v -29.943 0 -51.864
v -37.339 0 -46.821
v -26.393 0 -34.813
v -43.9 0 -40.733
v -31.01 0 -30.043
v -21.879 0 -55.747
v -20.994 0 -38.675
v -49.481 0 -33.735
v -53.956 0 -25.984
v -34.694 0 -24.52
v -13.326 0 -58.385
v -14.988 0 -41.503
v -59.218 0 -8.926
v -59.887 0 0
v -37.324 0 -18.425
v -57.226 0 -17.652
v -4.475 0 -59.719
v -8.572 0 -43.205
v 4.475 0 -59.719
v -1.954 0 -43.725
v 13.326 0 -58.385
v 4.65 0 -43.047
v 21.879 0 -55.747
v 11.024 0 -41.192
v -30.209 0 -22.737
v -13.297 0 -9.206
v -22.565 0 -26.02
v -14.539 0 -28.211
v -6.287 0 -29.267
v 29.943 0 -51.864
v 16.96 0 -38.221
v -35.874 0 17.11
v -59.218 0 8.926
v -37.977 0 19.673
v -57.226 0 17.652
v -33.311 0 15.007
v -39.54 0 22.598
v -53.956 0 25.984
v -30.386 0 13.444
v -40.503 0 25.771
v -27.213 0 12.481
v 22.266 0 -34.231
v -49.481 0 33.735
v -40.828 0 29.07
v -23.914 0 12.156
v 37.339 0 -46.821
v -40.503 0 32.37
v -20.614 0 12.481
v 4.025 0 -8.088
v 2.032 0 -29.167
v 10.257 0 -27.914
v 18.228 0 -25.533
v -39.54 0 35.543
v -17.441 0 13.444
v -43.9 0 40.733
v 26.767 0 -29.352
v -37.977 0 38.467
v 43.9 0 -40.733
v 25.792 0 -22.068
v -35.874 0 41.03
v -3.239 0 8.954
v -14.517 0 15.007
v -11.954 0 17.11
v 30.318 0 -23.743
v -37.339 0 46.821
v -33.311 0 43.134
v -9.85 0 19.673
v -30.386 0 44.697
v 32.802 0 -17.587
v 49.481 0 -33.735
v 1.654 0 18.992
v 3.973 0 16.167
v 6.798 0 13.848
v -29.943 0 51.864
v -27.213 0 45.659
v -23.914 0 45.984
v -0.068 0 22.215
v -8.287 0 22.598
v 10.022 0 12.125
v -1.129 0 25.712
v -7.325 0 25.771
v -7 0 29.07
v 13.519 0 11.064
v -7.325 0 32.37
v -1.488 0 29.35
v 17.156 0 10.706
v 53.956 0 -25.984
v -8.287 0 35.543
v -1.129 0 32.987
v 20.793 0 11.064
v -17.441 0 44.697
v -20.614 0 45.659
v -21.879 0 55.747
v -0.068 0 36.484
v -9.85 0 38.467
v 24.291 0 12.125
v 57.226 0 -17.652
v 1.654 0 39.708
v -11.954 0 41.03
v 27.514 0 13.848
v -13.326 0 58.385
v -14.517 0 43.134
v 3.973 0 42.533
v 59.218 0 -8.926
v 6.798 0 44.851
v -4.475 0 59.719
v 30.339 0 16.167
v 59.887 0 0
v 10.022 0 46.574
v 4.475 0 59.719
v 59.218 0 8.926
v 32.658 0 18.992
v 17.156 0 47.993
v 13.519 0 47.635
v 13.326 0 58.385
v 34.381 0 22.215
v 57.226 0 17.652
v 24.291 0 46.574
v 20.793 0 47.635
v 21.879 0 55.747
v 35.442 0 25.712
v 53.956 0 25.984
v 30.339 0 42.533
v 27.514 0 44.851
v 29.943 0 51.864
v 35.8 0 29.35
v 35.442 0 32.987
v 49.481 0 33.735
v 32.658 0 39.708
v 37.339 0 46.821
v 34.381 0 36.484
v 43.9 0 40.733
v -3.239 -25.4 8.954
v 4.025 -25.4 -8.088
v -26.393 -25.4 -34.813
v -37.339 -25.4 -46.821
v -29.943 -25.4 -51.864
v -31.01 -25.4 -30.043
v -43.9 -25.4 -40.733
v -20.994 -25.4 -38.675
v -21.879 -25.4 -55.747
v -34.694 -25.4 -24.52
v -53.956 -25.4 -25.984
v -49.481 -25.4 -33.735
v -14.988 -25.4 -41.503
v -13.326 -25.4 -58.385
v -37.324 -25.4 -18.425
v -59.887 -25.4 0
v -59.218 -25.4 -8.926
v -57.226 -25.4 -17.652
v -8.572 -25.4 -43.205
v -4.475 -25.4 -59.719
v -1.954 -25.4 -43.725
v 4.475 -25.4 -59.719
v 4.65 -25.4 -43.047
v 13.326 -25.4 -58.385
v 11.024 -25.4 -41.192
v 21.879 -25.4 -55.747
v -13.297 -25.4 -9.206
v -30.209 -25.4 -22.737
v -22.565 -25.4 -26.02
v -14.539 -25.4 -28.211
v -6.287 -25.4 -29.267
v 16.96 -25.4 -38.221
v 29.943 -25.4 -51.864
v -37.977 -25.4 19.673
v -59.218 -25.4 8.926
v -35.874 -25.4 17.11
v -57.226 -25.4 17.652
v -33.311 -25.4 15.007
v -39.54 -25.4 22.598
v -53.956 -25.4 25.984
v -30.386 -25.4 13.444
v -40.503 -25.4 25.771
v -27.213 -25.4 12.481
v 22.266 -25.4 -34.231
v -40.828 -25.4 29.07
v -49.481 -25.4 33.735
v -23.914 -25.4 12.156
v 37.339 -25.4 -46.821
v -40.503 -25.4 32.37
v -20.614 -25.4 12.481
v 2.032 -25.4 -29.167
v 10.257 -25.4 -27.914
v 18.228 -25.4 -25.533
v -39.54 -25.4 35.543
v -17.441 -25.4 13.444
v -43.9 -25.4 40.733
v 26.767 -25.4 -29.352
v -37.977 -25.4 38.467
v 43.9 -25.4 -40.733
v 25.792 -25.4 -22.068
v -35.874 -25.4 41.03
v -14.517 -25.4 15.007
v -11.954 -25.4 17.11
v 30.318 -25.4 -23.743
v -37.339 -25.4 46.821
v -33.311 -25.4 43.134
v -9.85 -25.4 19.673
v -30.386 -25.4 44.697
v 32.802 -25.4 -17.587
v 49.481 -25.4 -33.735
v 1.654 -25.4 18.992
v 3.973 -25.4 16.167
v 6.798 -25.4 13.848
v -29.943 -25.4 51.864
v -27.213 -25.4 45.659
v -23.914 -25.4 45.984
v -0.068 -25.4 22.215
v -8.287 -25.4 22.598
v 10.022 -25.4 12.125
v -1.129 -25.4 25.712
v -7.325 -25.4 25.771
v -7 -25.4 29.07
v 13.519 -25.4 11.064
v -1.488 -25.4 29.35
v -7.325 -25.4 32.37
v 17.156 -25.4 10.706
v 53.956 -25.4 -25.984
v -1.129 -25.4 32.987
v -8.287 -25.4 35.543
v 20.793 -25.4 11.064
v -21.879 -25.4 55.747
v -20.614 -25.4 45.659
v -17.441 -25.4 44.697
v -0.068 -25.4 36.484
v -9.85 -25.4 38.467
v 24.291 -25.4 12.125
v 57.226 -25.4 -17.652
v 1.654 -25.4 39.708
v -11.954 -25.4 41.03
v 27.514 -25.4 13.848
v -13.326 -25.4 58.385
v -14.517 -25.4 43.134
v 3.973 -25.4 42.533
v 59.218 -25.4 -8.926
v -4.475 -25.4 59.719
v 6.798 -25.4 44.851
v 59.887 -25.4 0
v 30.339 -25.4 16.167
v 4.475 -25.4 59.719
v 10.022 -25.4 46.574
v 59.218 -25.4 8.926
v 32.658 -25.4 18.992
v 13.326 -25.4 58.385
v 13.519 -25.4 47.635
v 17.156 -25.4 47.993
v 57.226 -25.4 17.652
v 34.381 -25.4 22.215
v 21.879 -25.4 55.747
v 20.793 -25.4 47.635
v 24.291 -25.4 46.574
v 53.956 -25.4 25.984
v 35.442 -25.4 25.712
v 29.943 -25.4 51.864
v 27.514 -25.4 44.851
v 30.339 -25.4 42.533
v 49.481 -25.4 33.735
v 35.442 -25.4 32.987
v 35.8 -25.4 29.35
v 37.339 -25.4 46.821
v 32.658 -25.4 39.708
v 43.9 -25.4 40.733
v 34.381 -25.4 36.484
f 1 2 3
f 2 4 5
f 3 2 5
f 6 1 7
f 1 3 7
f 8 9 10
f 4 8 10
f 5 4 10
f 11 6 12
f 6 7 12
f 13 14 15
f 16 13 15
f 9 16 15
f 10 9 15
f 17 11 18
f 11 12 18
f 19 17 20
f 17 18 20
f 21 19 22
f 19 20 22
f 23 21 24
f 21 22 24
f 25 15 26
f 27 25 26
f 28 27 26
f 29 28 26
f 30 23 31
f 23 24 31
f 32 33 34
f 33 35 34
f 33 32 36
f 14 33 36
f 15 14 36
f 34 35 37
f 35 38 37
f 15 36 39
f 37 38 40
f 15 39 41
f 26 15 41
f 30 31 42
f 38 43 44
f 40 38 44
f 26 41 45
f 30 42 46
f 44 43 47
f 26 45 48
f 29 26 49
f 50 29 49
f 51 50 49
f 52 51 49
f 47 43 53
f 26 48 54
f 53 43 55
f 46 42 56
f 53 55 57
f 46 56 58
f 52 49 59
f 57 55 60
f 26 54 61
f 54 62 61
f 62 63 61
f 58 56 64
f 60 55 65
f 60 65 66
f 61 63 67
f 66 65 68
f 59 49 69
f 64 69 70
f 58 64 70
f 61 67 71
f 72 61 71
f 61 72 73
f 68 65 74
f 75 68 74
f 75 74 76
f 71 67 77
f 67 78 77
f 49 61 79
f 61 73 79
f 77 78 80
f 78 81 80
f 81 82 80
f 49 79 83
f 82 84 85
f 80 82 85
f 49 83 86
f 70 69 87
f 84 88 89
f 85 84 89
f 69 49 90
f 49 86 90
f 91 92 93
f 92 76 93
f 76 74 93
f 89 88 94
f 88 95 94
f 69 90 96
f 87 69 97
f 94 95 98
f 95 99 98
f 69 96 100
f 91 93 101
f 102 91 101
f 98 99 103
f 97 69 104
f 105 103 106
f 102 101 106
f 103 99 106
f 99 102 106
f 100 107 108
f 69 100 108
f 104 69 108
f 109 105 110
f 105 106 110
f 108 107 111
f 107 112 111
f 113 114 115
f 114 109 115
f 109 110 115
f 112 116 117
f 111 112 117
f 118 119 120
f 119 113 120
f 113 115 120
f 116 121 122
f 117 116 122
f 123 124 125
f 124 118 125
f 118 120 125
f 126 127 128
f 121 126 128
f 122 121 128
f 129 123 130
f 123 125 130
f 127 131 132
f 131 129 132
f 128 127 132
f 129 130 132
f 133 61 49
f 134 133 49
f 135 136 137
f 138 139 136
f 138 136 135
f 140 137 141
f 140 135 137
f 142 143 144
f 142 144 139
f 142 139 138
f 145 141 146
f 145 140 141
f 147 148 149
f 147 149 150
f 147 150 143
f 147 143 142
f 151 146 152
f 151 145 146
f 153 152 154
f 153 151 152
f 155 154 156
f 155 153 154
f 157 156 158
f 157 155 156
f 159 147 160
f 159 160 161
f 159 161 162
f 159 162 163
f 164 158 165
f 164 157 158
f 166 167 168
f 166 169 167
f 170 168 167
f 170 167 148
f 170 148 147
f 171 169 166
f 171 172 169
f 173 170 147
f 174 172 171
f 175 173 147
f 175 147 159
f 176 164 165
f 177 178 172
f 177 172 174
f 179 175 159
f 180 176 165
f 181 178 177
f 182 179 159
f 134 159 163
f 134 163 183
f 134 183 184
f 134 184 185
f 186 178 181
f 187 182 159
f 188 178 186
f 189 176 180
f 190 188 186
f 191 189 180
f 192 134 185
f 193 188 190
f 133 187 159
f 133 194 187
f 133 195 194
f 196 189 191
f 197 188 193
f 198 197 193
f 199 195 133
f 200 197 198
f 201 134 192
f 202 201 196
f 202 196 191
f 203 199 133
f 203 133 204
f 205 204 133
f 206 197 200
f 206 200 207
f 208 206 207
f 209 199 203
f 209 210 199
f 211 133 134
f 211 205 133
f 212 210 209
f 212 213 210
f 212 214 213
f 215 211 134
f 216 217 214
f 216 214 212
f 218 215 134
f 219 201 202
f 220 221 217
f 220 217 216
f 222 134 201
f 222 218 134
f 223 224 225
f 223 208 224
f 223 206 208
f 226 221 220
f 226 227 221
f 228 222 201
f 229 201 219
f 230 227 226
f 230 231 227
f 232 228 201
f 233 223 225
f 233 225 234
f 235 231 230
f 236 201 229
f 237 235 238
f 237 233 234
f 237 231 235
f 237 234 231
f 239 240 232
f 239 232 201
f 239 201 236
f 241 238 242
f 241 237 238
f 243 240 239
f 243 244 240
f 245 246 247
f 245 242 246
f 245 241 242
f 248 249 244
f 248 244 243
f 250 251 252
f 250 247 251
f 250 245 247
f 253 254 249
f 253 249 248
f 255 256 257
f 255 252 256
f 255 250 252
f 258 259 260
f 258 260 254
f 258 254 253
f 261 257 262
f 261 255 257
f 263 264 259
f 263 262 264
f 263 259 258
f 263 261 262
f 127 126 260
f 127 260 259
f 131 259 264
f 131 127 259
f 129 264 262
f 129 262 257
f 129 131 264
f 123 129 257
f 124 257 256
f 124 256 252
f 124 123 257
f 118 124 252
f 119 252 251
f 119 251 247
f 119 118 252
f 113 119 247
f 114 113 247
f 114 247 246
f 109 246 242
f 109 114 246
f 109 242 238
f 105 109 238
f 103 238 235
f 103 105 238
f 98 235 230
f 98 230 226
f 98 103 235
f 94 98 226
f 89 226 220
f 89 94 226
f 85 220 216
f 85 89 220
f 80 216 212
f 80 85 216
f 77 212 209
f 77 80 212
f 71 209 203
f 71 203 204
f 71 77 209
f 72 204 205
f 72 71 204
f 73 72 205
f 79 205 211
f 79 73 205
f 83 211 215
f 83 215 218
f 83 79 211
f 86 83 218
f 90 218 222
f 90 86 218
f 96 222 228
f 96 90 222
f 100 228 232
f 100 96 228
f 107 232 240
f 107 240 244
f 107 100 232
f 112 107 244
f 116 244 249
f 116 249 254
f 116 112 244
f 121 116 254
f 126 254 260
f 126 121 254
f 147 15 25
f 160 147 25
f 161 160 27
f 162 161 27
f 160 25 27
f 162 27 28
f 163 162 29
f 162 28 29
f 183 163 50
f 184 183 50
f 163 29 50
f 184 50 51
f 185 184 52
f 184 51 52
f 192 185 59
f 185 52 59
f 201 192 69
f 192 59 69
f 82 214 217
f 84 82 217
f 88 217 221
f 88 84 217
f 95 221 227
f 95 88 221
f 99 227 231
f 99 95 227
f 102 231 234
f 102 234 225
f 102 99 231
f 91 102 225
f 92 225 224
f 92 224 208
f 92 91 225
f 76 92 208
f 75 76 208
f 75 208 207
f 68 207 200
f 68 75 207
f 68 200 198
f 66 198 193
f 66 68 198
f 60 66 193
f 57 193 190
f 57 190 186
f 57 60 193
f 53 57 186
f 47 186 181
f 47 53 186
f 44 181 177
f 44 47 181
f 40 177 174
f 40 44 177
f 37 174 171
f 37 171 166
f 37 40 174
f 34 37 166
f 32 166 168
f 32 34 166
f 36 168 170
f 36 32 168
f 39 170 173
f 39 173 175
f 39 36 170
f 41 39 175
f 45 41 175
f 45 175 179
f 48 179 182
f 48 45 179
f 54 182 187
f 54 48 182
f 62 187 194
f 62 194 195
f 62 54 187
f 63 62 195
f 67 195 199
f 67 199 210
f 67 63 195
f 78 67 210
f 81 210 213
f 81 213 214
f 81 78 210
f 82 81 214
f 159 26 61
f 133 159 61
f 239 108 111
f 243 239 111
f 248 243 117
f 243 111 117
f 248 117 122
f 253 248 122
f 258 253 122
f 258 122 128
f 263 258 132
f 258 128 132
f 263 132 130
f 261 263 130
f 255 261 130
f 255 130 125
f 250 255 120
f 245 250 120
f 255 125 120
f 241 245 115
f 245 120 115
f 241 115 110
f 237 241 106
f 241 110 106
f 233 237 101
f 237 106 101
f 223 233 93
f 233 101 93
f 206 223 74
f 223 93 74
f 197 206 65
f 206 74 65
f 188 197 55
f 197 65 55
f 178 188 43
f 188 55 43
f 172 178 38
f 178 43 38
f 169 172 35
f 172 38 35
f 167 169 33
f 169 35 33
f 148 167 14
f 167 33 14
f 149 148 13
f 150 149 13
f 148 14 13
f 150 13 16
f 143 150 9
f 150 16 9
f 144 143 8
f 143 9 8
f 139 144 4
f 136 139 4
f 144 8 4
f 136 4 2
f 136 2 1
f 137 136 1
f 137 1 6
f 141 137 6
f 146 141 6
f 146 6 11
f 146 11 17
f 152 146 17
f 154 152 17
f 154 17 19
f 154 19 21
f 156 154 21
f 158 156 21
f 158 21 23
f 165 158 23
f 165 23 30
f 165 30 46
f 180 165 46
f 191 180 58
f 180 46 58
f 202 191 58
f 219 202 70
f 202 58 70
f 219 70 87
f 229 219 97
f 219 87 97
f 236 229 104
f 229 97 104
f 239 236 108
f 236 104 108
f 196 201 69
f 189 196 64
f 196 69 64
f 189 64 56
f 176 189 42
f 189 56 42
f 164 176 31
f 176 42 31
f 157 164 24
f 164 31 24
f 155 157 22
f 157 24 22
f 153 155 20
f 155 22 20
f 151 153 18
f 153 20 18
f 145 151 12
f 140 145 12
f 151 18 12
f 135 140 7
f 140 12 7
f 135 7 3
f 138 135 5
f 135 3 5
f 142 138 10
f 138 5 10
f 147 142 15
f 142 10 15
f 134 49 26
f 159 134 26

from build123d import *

# Parameters (mm, degrees)
F0_R     = 59.886872
F0_R_2   = 16.913856
F0_R_3   = 18.643696
F1_DEPTH = 25.4


with BuildPart() as f1:
    # F0 (on Front) → F1 (new body)
    with BuildSketch(Plane.XZ):
        Circle(F0_R)
        with BuildLine():
            ThreePointArc((32.801818, -17.587269), (-1.953813, -43.724895), (-37.324231, -18.425429))
            ThreePointArc((-37.324231, -18.425429), (-2.125486, -29.361637), (32.801818, -17.587269))
        make_face(mode=Mode.SUBTRACT)
        Polygon((4.024993, -8.088123), (-13.296979, -9.20567), (-3.239061, 8.954463), align=None, mode=Mode.SUBTRACT)
        with Locations((-23.913672, 29.070303)):
            Circle(F0_R_2, mode=Mode.SUBTRACT)
        with Locations((17.156165, 29.349688)):
            Circle(F0_R_3, mode=Mode.SUBTRACT)
    extrude(amount=F1_DEPTH)


solid = f1.part
